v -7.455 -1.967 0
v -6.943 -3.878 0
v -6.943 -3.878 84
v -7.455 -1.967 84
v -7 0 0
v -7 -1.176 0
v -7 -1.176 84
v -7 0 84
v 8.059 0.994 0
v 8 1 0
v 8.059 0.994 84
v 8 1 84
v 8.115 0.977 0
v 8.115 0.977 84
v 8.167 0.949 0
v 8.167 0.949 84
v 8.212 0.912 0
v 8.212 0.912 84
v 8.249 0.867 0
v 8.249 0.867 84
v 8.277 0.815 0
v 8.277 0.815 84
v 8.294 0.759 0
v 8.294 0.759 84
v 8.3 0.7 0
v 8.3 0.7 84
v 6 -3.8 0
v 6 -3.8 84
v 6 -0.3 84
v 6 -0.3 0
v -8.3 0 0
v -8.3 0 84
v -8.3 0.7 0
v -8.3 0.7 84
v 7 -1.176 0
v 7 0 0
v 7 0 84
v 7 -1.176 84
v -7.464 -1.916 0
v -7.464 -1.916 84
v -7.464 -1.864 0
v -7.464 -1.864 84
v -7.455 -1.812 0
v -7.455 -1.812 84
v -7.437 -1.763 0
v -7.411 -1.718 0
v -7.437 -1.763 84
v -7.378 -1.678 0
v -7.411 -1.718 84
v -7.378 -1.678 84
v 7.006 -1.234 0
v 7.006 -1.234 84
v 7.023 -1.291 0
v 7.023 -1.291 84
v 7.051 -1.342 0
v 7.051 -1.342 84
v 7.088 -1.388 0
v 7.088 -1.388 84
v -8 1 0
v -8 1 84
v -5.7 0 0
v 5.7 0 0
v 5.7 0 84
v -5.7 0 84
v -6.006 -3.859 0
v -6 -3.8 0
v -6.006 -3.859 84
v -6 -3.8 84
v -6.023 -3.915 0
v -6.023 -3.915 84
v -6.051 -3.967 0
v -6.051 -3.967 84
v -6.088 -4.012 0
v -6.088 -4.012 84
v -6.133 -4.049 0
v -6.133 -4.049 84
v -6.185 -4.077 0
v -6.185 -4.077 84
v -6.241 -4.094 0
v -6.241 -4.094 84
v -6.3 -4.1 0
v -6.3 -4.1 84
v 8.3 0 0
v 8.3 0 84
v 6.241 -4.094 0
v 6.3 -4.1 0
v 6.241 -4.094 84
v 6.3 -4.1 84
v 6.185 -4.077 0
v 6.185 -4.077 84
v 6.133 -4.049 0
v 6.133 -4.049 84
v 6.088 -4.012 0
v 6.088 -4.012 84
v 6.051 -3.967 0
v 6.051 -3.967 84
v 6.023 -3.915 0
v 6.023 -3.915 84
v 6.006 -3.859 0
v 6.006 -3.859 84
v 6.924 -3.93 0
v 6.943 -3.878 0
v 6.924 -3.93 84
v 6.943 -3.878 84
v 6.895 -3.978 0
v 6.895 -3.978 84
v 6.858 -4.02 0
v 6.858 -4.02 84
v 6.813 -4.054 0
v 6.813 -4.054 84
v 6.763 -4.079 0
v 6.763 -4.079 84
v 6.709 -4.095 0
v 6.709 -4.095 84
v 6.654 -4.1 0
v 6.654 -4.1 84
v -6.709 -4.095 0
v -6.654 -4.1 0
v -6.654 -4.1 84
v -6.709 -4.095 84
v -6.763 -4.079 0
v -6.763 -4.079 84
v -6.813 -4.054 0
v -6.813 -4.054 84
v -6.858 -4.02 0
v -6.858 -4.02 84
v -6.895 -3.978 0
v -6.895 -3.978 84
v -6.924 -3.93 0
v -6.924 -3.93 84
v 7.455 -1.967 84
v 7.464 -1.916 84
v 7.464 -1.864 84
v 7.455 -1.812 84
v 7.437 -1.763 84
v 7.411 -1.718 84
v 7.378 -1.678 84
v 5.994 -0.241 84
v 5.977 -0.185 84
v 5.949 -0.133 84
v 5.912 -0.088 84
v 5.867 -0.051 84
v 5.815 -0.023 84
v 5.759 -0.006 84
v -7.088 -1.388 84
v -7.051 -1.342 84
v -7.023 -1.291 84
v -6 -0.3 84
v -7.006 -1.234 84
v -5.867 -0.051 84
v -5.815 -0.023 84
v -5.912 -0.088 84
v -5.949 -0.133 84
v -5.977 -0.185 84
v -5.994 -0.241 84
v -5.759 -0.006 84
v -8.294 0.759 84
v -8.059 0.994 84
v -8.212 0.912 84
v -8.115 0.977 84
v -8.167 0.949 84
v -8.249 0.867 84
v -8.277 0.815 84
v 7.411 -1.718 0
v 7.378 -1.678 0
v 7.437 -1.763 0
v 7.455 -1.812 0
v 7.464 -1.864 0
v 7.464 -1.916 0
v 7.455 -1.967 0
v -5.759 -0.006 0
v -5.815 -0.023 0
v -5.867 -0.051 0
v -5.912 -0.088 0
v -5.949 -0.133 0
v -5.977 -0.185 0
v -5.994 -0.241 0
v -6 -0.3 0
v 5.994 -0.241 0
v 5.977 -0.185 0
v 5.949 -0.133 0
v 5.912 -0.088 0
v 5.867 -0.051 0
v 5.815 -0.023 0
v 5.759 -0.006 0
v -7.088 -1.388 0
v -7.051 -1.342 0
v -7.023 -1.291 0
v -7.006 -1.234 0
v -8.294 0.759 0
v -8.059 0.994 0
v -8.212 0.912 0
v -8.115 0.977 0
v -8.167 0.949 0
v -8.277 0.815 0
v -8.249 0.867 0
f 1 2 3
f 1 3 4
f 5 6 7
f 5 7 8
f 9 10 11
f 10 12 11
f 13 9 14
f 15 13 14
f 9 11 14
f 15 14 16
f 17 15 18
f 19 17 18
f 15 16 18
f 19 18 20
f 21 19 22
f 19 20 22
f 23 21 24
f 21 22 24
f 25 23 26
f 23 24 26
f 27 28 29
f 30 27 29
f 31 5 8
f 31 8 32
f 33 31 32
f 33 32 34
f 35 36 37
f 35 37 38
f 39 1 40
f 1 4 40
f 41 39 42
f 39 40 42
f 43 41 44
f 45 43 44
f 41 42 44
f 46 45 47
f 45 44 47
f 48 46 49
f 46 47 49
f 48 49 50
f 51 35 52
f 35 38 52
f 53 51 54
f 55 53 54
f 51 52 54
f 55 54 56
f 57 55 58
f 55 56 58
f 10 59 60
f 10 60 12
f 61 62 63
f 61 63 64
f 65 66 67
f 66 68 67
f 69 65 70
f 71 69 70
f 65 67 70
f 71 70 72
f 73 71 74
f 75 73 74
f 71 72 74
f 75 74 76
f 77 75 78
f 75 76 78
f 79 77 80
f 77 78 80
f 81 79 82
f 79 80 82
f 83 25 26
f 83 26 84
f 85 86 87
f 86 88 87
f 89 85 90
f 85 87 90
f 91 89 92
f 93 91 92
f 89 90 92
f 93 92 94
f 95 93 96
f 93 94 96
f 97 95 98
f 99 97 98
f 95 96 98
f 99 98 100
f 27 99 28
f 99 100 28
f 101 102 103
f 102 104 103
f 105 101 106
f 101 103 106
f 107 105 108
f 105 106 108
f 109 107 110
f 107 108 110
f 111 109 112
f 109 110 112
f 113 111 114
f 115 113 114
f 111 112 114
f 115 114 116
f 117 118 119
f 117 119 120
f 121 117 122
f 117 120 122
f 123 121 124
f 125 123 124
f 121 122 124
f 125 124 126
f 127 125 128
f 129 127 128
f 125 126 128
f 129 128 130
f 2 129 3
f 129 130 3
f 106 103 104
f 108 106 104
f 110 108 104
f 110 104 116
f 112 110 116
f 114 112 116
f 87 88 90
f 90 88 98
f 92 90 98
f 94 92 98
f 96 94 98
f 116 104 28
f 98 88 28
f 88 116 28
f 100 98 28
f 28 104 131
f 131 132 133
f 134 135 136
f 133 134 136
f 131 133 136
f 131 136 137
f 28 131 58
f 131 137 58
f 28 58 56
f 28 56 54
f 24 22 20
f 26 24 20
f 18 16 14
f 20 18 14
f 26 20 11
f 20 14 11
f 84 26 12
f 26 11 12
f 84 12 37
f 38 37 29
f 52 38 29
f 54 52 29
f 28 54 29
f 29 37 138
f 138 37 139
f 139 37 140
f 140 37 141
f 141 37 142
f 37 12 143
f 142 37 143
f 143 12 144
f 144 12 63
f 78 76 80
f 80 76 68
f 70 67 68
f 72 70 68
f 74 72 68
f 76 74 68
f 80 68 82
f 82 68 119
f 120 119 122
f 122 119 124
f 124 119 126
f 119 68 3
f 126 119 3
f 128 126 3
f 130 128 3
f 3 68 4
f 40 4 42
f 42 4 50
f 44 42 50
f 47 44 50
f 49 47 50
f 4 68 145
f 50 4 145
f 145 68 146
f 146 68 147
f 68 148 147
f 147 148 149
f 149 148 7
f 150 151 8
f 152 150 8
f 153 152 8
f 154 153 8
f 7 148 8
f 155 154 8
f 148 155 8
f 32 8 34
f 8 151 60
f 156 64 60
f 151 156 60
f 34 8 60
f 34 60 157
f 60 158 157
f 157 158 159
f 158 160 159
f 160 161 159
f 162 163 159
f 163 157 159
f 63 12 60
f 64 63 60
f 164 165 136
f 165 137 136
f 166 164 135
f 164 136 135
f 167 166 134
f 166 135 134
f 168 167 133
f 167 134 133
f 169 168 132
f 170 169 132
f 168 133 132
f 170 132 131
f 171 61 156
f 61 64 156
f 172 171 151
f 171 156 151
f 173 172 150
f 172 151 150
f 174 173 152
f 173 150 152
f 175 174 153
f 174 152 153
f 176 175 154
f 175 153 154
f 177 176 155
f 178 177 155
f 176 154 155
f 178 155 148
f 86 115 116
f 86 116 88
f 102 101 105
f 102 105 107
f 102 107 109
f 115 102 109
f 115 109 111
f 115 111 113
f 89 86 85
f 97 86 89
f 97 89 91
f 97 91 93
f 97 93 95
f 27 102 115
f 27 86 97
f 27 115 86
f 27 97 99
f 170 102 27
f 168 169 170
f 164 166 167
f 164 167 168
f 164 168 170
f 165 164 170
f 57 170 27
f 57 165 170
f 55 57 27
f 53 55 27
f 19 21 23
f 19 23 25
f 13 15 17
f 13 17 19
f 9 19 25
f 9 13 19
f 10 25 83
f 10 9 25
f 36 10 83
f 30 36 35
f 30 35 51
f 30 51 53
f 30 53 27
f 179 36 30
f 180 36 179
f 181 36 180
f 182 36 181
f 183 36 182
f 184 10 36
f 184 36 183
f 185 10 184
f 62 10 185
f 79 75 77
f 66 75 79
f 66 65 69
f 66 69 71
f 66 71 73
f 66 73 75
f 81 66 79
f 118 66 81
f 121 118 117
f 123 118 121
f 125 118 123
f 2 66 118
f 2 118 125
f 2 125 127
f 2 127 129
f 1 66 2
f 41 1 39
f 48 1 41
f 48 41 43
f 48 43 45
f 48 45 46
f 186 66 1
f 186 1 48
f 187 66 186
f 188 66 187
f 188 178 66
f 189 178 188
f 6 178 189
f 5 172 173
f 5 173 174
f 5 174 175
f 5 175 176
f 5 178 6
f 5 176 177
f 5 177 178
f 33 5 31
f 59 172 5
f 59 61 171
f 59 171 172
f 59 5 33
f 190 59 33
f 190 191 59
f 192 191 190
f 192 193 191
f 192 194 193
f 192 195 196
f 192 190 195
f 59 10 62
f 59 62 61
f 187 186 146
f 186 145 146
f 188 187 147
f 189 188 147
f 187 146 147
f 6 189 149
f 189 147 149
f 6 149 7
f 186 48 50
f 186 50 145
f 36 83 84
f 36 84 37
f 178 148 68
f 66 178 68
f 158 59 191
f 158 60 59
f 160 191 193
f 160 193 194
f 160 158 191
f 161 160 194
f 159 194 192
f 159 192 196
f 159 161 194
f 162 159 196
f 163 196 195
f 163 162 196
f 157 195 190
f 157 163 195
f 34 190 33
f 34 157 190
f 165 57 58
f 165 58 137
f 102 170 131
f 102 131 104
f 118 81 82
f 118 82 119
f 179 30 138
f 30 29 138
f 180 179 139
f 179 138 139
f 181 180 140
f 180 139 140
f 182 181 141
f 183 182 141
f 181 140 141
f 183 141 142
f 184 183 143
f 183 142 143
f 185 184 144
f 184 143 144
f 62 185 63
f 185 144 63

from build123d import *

# Parameters (mm, degrees)
BOSS_EXTRUDE1_DEPTH = 84
FILLET1_R           = 0.3


with BuildPart() as part:
    # Sketch1 → Boss-Extrude1 (new body)
    with BuildSketch(Plane.XY):
        Polygon((-8.3, 1), (8.3, 1), (8.3, 0), (7, 0), (7, -1.3), (7.5, -1.8), (6.883716857, -4.1), (6, -4.1), (6, 0), (-6, 0), (-6, -4.1), (-6.883716857, -4.1), (-7.5, -1.8), (-7, -1.3), (-7, 0), (-8.3, 0), align=None)
    extrude(amount=BOSS_EXTRUDE1_DEPTH)

    # Fillet1
    fillet1_edges = [part.edges().sort_by_distance(p)[0] for p in [
        (-8.3, 1, 42),
        (8.3, 1, 42),
        (7, -1.3, 42),
        (7.5, -1.8, 42),
        (6.883716857, -4.1, 42),
        (6, -4.1, 42),
        (6, 0, 42),
        (-6, 0, 42),
        (-6, -4.1, 42),
        (-6.883716857, -4.1, 42),
        (-7.5, -1.8, 42),
        (-7, -1.3, 42),
    ]]
    fillet(fillet1_edges, radius=FILLET1_R)


solid = part.part
